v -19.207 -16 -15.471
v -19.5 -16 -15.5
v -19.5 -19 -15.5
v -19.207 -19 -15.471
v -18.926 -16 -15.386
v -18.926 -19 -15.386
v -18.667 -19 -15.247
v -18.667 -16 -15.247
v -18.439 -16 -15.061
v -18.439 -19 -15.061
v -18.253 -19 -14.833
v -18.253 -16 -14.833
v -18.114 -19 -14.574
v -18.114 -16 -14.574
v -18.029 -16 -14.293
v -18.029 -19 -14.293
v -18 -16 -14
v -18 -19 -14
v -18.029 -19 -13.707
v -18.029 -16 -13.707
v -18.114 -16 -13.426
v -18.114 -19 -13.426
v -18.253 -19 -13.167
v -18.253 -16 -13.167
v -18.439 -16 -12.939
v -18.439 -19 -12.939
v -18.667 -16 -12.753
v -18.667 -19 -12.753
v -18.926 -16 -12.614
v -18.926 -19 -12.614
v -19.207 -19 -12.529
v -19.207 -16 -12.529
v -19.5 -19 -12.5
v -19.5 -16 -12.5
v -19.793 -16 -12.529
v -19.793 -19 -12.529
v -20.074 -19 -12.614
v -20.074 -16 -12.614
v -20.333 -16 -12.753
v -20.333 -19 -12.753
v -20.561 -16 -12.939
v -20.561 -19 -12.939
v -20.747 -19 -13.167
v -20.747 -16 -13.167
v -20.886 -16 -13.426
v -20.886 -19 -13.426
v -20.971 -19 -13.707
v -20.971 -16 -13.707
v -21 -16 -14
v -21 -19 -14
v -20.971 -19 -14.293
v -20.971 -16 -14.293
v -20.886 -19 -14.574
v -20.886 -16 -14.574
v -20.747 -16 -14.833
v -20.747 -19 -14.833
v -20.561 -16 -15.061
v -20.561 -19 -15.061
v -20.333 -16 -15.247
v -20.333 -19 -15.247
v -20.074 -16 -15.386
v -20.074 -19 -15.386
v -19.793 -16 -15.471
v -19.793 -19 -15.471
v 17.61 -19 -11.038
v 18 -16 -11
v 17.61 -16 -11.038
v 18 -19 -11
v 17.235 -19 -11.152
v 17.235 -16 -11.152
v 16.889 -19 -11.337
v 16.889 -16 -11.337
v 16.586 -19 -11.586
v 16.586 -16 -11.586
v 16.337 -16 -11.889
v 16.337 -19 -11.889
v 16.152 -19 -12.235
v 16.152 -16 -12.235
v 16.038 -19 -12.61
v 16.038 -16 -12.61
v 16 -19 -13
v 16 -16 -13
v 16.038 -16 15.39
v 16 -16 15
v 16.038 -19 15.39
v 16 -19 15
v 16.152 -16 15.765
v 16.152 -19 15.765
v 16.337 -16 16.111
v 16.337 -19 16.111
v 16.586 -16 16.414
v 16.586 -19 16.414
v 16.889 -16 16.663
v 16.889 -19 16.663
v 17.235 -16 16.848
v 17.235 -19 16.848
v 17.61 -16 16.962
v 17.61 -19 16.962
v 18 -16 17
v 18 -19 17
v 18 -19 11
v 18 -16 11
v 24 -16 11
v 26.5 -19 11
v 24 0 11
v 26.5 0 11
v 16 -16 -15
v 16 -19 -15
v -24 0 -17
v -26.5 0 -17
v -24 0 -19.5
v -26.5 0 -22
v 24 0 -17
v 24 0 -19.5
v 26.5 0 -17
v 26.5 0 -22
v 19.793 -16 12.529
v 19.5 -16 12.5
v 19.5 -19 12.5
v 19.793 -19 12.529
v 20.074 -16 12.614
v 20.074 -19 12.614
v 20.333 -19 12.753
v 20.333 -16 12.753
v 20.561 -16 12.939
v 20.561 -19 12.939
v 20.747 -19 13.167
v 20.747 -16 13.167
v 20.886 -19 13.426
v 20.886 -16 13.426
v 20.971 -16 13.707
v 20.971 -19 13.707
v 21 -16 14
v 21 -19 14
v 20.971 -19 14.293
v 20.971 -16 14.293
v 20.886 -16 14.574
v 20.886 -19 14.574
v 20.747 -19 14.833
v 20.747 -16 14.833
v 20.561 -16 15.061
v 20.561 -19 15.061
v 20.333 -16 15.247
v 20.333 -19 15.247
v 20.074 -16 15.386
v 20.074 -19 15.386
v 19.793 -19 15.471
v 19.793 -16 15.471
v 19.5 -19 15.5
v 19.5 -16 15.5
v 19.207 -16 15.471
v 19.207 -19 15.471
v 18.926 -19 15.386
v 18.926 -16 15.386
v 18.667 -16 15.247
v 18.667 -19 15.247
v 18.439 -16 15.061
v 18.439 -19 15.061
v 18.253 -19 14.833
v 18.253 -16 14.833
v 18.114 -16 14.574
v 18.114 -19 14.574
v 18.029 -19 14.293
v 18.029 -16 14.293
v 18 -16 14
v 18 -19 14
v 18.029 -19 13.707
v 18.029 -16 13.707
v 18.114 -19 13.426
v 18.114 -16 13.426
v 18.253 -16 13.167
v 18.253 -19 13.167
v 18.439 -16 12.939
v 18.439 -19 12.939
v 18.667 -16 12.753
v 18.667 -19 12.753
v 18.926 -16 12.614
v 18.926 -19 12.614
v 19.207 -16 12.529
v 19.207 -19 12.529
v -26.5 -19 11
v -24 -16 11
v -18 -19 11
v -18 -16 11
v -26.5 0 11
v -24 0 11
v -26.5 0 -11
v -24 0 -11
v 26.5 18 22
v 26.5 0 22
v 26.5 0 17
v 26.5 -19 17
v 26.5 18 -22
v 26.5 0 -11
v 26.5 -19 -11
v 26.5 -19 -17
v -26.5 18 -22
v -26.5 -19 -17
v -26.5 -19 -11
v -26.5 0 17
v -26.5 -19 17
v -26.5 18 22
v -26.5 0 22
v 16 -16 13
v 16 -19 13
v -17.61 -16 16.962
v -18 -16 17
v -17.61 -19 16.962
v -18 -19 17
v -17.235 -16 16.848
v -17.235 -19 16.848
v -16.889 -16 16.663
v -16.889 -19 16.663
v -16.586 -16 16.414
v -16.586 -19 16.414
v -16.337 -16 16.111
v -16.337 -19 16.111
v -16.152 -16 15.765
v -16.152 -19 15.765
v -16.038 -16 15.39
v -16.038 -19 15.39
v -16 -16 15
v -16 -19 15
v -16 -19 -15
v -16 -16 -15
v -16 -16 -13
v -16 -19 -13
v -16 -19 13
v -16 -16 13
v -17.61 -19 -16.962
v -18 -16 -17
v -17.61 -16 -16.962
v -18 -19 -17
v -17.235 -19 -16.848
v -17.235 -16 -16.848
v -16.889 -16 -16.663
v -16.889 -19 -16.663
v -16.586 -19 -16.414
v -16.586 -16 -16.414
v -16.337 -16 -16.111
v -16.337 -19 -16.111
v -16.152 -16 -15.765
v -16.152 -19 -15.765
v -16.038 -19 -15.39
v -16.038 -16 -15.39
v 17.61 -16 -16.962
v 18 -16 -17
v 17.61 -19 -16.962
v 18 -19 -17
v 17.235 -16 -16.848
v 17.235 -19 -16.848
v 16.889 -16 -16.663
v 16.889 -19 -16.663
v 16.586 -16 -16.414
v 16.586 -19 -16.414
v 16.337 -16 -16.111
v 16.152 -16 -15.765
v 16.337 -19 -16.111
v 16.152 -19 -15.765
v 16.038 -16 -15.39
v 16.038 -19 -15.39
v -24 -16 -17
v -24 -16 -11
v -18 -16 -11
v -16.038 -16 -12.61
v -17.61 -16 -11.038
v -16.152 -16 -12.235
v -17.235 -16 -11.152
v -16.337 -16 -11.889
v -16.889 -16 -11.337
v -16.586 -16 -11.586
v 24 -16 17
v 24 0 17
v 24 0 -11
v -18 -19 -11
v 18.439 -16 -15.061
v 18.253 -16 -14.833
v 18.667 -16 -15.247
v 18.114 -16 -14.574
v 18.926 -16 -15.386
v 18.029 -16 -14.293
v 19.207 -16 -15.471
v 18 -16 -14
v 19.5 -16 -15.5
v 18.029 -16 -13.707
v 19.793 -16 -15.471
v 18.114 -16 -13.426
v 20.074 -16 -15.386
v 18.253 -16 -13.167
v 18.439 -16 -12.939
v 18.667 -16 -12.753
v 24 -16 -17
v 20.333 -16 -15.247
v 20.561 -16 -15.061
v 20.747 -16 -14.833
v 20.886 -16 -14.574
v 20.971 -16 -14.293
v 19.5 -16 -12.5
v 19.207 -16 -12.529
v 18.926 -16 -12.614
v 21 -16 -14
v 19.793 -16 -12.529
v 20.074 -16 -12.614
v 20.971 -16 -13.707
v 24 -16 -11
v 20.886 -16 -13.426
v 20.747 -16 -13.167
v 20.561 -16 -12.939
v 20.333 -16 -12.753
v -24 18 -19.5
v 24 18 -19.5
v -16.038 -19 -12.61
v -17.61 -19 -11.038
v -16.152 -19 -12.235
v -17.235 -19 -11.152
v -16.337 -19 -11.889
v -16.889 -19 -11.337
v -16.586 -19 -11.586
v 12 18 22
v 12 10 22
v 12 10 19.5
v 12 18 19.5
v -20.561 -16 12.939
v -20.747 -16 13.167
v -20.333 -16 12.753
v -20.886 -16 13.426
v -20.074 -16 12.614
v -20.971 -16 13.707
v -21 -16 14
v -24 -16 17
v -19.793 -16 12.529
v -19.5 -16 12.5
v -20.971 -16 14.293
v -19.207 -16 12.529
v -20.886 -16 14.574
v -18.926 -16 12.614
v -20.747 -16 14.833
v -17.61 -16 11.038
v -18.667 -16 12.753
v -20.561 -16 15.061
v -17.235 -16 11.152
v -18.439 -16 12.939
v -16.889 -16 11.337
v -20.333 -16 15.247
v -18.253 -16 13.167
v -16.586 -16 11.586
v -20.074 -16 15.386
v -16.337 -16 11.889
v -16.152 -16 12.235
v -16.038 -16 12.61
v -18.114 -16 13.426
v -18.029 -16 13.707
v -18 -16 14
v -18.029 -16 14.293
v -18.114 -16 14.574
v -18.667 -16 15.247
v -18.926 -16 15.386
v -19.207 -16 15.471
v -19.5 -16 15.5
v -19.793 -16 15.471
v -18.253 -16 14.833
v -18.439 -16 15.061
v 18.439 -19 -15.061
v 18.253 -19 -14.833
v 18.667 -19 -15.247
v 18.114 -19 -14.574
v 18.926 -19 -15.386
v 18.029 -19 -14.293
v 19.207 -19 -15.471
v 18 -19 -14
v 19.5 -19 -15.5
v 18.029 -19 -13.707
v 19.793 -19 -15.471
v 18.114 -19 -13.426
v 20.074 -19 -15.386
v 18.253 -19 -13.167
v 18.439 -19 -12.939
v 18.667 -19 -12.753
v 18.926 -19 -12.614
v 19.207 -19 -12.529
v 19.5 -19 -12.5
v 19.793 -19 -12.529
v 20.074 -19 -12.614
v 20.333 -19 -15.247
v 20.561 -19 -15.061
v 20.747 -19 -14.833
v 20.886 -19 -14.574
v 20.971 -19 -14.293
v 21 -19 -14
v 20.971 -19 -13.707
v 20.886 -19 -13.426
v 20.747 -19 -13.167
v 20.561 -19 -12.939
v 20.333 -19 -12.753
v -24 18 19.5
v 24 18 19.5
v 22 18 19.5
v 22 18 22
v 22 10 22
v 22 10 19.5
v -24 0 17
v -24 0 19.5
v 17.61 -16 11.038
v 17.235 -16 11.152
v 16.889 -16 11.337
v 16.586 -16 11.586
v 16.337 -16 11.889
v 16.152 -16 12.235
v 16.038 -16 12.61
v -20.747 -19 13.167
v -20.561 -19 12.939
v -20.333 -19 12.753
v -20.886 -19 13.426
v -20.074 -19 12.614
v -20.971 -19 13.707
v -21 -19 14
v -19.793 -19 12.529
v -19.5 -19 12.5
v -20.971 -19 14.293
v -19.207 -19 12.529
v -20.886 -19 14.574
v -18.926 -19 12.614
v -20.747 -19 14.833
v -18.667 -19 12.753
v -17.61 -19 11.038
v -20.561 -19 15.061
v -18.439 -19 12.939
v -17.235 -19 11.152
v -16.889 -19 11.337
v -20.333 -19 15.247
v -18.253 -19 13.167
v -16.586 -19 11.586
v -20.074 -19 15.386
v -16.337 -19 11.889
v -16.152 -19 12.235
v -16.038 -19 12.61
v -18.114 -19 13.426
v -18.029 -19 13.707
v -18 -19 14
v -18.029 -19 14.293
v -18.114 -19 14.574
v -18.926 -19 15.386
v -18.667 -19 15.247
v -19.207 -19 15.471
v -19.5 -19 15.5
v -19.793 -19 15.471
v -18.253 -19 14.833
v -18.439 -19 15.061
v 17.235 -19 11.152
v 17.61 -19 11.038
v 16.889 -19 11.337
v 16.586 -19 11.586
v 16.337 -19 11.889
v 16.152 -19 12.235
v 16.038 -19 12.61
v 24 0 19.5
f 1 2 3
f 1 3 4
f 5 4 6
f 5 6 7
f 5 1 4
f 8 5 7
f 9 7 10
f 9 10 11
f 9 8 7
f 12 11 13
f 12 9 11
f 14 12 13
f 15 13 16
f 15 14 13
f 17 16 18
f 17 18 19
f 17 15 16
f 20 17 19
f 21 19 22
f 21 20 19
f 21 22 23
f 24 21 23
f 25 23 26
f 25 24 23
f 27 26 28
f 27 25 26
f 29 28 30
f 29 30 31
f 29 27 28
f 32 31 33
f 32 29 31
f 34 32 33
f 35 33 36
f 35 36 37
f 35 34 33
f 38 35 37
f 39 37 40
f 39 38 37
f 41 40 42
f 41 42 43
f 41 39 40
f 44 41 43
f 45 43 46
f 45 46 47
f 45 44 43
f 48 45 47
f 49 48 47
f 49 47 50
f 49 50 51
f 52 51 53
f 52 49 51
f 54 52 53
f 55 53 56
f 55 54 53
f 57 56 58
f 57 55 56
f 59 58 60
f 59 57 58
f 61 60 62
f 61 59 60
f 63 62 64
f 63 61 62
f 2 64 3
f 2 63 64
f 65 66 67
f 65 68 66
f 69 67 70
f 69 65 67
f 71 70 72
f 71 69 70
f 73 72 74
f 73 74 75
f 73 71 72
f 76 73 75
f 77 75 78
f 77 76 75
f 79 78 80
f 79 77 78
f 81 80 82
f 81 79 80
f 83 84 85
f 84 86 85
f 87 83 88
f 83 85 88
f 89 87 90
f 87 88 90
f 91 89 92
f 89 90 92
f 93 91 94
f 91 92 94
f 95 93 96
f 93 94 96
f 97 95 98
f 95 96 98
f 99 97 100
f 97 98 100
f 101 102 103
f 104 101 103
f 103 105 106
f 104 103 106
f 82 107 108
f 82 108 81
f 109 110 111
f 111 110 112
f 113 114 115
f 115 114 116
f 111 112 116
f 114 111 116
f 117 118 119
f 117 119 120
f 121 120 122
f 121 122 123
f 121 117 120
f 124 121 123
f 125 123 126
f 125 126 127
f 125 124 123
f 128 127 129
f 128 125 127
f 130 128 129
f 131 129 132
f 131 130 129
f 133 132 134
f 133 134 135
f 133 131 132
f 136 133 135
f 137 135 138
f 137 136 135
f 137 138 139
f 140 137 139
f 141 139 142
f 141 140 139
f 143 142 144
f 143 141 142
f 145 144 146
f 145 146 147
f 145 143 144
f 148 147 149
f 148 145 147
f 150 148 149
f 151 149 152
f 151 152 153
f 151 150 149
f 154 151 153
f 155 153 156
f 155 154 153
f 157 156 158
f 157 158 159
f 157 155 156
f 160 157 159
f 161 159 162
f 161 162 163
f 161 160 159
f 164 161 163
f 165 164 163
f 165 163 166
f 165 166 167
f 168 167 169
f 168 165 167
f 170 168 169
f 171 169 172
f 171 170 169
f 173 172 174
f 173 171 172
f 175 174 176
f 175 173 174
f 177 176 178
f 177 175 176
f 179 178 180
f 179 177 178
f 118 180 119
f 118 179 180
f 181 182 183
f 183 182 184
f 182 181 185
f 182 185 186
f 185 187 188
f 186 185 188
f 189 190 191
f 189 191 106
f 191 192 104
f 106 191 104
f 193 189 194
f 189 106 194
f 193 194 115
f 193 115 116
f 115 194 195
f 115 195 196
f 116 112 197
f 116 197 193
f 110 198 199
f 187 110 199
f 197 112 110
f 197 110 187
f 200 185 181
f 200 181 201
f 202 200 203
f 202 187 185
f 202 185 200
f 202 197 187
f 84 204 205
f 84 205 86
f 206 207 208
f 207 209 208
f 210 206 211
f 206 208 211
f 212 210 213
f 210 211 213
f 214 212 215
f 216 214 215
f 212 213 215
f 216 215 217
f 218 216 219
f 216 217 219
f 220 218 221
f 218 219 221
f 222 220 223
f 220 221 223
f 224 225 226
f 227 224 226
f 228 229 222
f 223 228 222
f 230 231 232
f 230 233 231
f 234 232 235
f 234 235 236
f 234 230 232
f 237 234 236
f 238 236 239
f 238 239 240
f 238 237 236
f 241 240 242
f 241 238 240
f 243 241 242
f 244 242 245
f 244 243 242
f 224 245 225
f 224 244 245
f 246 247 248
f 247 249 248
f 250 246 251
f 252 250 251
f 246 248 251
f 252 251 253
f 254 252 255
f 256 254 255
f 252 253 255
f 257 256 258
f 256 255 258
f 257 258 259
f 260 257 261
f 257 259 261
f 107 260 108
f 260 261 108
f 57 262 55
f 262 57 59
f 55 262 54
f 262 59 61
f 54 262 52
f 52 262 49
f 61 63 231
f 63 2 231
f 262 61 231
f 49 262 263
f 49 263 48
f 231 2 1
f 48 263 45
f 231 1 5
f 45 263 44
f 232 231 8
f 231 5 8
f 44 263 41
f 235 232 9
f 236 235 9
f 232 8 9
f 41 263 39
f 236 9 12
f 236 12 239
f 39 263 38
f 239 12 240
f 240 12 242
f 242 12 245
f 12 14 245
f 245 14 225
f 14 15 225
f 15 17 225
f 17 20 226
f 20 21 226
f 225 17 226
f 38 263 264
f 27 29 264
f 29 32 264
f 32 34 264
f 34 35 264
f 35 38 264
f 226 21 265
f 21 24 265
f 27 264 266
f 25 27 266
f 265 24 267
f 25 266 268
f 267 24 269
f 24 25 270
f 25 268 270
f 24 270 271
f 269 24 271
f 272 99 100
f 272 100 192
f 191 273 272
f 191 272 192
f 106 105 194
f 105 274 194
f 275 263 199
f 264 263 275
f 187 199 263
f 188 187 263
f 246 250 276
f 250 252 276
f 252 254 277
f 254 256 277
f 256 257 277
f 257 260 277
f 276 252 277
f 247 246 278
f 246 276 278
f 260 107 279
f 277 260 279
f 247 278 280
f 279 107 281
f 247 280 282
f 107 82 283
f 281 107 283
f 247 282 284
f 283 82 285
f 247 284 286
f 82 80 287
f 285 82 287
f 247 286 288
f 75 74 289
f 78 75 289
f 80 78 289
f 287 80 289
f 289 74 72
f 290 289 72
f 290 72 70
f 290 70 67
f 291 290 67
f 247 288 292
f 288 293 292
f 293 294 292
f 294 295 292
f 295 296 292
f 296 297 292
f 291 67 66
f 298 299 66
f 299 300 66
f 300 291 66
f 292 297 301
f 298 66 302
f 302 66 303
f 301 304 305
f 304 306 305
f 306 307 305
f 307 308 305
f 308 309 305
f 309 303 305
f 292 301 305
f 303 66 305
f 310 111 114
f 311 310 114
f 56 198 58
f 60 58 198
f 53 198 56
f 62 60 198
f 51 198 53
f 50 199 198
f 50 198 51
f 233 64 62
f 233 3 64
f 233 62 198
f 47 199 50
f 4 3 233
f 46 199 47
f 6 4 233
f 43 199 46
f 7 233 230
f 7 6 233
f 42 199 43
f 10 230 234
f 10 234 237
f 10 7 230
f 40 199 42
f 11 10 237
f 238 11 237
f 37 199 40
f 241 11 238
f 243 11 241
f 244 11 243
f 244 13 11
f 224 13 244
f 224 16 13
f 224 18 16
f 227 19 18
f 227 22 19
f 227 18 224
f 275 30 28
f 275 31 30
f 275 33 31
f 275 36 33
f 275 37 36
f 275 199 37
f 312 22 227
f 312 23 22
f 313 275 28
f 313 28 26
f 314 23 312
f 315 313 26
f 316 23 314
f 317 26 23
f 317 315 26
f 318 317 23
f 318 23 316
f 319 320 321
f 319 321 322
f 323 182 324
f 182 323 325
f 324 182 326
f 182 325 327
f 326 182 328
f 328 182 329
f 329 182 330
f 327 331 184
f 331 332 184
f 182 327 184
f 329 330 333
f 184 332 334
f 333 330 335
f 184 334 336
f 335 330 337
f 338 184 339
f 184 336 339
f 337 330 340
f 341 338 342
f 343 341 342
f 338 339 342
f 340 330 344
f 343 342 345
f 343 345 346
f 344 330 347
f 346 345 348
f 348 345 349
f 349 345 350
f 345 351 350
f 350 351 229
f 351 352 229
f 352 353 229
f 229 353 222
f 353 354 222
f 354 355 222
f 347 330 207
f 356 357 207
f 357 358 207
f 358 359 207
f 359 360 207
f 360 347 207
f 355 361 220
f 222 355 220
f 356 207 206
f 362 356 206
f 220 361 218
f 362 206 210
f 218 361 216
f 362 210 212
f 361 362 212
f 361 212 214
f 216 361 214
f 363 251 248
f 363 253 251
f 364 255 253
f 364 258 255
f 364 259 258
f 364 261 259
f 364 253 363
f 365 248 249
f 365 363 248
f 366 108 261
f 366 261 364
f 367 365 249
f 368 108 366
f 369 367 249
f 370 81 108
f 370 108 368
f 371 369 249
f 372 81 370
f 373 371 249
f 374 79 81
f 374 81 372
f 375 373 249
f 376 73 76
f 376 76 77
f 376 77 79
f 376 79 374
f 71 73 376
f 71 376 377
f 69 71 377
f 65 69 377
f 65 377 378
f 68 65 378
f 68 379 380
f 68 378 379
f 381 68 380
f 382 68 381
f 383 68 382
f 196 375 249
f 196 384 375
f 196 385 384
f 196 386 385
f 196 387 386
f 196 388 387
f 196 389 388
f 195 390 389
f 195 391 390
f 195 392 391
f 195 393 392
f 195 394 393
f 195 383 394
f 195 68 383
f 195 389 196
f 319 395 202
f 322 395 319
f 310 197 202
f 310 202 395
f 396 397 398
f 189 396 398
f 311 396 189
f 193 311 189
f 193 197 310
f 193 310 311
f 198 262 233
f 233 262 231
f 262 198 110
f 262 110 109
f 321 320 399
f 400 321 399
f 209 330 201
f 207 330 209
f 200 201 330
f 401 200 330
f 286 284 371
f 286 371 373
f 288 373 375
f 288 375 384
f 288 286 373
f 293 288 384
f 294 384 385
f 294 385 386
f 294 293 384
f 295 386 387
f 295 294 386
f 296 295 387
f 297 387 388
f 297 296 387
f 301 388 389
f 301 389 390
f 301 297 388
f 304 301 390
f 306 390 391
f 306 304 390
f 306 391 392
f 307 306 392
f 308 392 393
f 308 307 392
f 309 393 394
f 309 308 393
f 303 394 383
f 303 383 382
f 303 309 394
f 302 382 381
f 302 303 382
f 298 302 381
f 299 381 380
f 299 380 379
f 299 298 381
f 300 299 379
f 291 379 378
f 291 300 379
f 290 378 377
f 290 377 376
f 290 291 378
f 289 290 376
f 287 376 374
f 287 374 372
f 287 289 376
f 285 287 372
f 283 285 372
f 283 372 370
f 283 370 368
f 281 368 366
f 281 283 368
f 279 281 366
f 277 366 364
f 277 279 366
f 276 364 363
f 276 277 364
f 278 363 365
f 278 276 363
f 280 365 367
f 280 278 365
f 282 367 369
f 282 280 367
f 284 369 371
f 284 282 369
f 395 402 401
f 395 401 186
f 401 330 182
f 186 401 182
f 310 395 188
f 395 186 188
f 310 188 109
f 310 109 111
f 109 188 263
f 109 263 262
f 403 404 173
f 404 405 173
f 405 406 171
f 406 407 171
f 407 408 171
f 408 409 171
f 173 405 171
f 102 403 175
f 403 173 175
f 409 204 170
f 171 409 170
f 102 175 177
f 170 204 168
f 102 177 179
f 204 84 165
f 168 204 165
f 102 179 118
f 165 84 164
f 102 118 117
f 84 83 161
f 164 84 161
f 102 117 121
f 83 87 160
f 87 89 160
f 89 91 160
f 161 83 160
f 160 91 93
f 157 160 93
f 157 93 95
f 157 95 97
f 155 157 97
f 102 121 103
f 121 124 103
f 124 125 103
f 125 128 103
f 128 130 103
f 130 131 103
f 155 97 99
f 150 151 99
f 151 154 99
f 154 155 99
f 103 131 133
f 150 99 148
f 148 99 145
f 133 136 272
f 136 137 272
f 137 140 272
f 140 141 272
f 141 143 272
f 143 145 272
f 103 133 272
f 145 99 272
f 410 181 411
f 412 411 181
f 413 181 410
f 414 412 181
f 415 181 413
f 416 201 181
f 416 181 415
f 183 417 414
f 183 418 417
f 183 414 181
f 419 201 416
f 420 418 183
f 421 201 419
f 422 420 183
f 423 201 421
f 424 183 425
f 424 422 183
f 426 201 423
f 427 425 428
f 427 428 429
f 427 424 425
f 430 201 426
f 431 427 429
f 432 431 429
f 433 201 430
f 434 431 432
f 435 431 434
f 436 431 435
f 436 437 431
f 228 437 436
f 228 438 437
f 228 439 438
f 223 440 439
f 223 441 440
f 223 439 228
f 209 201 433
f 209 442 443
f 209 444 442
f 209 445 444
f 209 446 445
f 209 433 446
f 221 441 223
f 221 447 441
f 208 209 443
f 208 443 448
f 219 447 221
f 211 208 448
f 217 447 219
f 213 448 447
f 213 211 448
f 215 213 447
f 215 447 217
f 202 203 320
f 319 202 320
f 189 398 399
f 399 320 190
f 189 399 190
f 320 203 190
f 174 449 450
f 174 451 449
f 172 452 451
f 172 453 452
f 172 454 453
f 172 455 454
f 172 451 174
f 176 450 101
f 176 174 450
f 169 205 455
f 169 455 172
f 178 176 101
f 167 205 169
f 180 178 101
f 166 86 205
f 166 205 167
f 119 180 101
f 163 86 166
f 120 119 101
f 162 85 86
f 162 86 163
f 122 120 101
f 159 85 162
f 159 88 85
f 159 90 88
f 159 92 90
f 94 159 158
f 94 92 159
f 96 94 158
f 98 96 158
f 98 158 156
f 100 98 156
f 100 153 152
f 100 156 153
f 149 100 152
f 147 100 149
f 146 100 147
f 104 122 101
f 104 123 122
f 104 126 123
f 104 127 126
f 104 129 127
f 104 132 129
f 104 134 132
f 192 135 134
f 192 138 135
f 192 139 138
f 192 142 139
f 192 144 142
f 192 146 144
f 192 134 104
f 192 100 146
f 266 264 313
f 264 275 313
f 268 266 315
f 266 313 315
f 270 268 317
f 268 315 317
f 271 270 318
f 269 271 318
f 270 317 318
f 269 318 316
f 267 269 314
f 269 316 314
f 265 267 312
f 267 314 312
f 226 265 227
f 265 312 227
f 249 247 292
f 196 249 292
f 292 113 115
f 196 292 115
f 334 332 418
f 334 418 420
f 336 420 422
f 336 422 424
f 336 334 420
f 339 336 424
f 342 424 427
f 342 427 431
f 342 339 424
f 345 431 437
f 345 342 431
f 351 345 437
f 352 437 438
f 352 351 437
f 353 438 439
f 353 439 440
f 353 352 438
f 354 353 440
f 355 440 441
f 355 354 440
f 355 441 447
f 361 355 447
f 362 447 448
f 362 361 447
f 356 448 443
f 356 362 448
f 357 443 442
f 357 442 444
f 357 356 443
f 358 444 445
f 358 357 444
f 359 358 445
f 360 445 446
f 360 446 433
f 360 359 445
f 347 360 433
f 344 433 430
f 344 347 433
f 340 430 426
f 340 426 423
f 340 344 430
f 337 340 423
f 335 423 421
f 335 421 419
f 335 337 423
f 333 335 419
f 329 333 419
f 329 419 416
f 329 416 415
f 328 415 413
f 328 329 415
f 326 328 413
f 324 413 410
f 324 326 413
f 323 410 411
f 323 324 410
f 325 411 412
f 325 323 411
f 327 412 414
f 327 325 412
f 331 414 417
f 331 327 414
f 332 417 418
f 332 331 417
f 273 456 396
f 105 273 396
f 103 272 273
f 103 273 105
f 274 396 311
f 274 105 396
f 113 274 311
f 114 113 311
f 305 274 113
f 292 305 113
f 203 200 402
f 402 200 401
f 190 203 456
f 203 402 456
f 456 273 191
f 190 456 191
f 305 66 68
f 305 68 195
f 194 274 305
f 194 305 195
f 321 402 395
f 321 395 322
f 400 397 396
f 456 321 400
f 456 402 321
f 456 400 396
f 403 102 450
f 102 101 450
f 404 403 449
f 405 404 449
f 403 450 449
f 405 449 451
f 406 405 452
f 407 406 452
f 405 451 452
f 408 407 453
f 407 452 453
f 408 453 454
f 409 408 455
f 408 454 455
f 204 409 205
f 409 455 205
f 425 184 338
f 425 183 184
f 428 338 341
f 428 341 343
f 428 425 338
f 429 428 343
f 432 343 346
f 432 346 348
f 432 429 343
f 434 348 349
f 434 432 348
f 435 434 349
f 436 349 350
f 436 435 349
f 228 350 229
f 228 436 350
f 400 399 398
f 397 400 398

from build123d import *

# Parameters (mm, degrees)
SKETCH_1_W          = 53
SKETCH_1_H          = 44
SKETCH_1_W_2        = 48
SKETCH_1_H_2        = 39
EXTRUDE_1_DEPTH     = 18
SKETCH_2_W          = 2.5
SKETCH_2_H          = 6
EXTRUDE_2_DEPTH     = 16
SKETCH_3_W          = 8
SKETCH_3_H          = 6
SKETCH_3_R          = 1.5
SKETCH_3_W_2        = 2.5
EXTRUDE_3_DEPTH     = 3
FILLET_1_R          = 2
SKETCH_4_W          = 10
SKETCH_4_H          = 8
CUT_EXTRUDE_1_DEPTH = 5


with BuildPart() as part:
    # 草图1 → 凸台-拉伸1 (new body)
    with BuildSketch(Plane(origin=(0, 0, 0), x_dir=(1, 0, 0), z_dir=(0, 1, 0))):
        Rectangle(SKETCH_1_W, SKETCH_1_H)
        Rectangle(SKETCH_1_W_2, SKETCH_1_H_2, mode=Mode.SUBTRACT)
    extrude(amount=EXTRUDE_1_DEPTH)

    # 草图2 → 凸台-拉伸2 (add)
    with BuildSketch(Plane.XZ):
        with Locations((25.25, 14)):
            Rectangle(SKETCH_2_W, SKETCH_2_H)
        with Locations((25.25, -14)):
            Rectangle(SKETCH_2_W, SKETCH_2_H)
        with Locations((-25.25, -14)):
            Rectangle(SKETCH_2_W, SKETCH_2_H)
        with Locations((-25.25, 14)):
            Rectangle(SKETCH_2_W, SKETCH_2_H)
    extrude(amount=EXTRUDE_2_DEPTH)

    # 草图3 → 凸台-拉伸3 (add)
    # profile 1 of 8: a face of its own
    with BuildSketch(Plane.XZ.offset(16)):
        with Locations((-20, 14)):
            Rectangle(SKETCH_3_W, SKETCH_3_H)
        with Locations(Location((-19.5, 14, 0), (0, 0, 270))):
            Circle(SKETCH_3_R, mode=Mode.SUBTRACT)
    # profile 2 of 8: a face of its own
    with BuildSketch(Plane.XZ.offset(16)):
        with Locations((-25.25, 14)):
            Rectangle(SKETCH_3_W_2, SKETCH_3_H)
    # profile 3 of 8: a face of its own
    with BuildSketch(Plane.XZ.offset(16)):
        with Locations((25.25, 14)):
            Rectangle(SKETCH_3_W_2, SKETCH_3_H)
    # profile 4 of 8: a face of its own
    with BuildSketch(Plane.XZ.offset(16)):
        with Locations((20, 14)):
            Rectangle(SKETCH_3_W, SKETCH_3_H)
        with Locations(Location((19.5, 14, 0), (0, 0, 270))):
            Circle(SKETCH_3_R, mode=Mode.SUBTRACT)
    # profile 5 of 8: a face of its own
    with BuildSketch(Plane.XZ.offset(16)):
        with Locations((20, -14)):
            Rectangle(SKETCH_3_W, SKETCH_3_H)
        with Locations(Location((19.5, -14, 0), (0, 0, 270))):
            Circle(SKETCH_3_R, mode=Mode.SUBTRACT)
    # profile 6 of 8: a face of its own
    with BuildSketch(Plane.XZ.offset(16)):
        with Locations((25.25, -14)):
            Rectangle(SKETCH_3_W_2, SKETCH_3_H)
    # profile 7 of 8: a face of its own
    with BuildSketch(Plane.XZ.offset(16)):
        with Locations((-25.25, -14)):
            Rectangle(SKETCH_3_W_2, SKETCH_3_H)
    # profile 8 of 8: a face of its own
    with BuildSketch(Plane.XZ.offset(16)):
        with Locations((-20, -14)):
            Rectangle(SKETCH_3_W, SKETCH_3_H)
        with Locations(Location((-19.5, -14, 0), (0, 0, 270))):
            Circle(SKETCH_3_R, mode=Mode.SUBTRACT)
    extrude(amount=EXTRUDE_3_DEPTH)

    # 圆角1
    fillet_1_edges = [part.edges().sort_by_distance(p)[0] for p in [
        (16, -17.5, -17),
        (16, -17.5, -11),
        (-16, -17.5, -17),
        (-16, -17.5, -11),
        (-16, -17.5, 17),
        (-16, -17.5, 11),
        (16, -17.5, 17),
        (16, -17.5, 11),
    ]]
    fillet(fillet_1_edges, radius=FILLET_1_R)

    # 草图4 → 切除-拉伸1 (cut)
    with BuildSketch(Plane.XY.offset(22)):
        with Locations((17, 14)):
            Rectangle(SKETCH_4_W, SKETCH_4_H)
    extrude(amount=-CUT_EXTRUDE_1_DEPTH, mode=Mode.SUBTRACT)


solid = part.part
